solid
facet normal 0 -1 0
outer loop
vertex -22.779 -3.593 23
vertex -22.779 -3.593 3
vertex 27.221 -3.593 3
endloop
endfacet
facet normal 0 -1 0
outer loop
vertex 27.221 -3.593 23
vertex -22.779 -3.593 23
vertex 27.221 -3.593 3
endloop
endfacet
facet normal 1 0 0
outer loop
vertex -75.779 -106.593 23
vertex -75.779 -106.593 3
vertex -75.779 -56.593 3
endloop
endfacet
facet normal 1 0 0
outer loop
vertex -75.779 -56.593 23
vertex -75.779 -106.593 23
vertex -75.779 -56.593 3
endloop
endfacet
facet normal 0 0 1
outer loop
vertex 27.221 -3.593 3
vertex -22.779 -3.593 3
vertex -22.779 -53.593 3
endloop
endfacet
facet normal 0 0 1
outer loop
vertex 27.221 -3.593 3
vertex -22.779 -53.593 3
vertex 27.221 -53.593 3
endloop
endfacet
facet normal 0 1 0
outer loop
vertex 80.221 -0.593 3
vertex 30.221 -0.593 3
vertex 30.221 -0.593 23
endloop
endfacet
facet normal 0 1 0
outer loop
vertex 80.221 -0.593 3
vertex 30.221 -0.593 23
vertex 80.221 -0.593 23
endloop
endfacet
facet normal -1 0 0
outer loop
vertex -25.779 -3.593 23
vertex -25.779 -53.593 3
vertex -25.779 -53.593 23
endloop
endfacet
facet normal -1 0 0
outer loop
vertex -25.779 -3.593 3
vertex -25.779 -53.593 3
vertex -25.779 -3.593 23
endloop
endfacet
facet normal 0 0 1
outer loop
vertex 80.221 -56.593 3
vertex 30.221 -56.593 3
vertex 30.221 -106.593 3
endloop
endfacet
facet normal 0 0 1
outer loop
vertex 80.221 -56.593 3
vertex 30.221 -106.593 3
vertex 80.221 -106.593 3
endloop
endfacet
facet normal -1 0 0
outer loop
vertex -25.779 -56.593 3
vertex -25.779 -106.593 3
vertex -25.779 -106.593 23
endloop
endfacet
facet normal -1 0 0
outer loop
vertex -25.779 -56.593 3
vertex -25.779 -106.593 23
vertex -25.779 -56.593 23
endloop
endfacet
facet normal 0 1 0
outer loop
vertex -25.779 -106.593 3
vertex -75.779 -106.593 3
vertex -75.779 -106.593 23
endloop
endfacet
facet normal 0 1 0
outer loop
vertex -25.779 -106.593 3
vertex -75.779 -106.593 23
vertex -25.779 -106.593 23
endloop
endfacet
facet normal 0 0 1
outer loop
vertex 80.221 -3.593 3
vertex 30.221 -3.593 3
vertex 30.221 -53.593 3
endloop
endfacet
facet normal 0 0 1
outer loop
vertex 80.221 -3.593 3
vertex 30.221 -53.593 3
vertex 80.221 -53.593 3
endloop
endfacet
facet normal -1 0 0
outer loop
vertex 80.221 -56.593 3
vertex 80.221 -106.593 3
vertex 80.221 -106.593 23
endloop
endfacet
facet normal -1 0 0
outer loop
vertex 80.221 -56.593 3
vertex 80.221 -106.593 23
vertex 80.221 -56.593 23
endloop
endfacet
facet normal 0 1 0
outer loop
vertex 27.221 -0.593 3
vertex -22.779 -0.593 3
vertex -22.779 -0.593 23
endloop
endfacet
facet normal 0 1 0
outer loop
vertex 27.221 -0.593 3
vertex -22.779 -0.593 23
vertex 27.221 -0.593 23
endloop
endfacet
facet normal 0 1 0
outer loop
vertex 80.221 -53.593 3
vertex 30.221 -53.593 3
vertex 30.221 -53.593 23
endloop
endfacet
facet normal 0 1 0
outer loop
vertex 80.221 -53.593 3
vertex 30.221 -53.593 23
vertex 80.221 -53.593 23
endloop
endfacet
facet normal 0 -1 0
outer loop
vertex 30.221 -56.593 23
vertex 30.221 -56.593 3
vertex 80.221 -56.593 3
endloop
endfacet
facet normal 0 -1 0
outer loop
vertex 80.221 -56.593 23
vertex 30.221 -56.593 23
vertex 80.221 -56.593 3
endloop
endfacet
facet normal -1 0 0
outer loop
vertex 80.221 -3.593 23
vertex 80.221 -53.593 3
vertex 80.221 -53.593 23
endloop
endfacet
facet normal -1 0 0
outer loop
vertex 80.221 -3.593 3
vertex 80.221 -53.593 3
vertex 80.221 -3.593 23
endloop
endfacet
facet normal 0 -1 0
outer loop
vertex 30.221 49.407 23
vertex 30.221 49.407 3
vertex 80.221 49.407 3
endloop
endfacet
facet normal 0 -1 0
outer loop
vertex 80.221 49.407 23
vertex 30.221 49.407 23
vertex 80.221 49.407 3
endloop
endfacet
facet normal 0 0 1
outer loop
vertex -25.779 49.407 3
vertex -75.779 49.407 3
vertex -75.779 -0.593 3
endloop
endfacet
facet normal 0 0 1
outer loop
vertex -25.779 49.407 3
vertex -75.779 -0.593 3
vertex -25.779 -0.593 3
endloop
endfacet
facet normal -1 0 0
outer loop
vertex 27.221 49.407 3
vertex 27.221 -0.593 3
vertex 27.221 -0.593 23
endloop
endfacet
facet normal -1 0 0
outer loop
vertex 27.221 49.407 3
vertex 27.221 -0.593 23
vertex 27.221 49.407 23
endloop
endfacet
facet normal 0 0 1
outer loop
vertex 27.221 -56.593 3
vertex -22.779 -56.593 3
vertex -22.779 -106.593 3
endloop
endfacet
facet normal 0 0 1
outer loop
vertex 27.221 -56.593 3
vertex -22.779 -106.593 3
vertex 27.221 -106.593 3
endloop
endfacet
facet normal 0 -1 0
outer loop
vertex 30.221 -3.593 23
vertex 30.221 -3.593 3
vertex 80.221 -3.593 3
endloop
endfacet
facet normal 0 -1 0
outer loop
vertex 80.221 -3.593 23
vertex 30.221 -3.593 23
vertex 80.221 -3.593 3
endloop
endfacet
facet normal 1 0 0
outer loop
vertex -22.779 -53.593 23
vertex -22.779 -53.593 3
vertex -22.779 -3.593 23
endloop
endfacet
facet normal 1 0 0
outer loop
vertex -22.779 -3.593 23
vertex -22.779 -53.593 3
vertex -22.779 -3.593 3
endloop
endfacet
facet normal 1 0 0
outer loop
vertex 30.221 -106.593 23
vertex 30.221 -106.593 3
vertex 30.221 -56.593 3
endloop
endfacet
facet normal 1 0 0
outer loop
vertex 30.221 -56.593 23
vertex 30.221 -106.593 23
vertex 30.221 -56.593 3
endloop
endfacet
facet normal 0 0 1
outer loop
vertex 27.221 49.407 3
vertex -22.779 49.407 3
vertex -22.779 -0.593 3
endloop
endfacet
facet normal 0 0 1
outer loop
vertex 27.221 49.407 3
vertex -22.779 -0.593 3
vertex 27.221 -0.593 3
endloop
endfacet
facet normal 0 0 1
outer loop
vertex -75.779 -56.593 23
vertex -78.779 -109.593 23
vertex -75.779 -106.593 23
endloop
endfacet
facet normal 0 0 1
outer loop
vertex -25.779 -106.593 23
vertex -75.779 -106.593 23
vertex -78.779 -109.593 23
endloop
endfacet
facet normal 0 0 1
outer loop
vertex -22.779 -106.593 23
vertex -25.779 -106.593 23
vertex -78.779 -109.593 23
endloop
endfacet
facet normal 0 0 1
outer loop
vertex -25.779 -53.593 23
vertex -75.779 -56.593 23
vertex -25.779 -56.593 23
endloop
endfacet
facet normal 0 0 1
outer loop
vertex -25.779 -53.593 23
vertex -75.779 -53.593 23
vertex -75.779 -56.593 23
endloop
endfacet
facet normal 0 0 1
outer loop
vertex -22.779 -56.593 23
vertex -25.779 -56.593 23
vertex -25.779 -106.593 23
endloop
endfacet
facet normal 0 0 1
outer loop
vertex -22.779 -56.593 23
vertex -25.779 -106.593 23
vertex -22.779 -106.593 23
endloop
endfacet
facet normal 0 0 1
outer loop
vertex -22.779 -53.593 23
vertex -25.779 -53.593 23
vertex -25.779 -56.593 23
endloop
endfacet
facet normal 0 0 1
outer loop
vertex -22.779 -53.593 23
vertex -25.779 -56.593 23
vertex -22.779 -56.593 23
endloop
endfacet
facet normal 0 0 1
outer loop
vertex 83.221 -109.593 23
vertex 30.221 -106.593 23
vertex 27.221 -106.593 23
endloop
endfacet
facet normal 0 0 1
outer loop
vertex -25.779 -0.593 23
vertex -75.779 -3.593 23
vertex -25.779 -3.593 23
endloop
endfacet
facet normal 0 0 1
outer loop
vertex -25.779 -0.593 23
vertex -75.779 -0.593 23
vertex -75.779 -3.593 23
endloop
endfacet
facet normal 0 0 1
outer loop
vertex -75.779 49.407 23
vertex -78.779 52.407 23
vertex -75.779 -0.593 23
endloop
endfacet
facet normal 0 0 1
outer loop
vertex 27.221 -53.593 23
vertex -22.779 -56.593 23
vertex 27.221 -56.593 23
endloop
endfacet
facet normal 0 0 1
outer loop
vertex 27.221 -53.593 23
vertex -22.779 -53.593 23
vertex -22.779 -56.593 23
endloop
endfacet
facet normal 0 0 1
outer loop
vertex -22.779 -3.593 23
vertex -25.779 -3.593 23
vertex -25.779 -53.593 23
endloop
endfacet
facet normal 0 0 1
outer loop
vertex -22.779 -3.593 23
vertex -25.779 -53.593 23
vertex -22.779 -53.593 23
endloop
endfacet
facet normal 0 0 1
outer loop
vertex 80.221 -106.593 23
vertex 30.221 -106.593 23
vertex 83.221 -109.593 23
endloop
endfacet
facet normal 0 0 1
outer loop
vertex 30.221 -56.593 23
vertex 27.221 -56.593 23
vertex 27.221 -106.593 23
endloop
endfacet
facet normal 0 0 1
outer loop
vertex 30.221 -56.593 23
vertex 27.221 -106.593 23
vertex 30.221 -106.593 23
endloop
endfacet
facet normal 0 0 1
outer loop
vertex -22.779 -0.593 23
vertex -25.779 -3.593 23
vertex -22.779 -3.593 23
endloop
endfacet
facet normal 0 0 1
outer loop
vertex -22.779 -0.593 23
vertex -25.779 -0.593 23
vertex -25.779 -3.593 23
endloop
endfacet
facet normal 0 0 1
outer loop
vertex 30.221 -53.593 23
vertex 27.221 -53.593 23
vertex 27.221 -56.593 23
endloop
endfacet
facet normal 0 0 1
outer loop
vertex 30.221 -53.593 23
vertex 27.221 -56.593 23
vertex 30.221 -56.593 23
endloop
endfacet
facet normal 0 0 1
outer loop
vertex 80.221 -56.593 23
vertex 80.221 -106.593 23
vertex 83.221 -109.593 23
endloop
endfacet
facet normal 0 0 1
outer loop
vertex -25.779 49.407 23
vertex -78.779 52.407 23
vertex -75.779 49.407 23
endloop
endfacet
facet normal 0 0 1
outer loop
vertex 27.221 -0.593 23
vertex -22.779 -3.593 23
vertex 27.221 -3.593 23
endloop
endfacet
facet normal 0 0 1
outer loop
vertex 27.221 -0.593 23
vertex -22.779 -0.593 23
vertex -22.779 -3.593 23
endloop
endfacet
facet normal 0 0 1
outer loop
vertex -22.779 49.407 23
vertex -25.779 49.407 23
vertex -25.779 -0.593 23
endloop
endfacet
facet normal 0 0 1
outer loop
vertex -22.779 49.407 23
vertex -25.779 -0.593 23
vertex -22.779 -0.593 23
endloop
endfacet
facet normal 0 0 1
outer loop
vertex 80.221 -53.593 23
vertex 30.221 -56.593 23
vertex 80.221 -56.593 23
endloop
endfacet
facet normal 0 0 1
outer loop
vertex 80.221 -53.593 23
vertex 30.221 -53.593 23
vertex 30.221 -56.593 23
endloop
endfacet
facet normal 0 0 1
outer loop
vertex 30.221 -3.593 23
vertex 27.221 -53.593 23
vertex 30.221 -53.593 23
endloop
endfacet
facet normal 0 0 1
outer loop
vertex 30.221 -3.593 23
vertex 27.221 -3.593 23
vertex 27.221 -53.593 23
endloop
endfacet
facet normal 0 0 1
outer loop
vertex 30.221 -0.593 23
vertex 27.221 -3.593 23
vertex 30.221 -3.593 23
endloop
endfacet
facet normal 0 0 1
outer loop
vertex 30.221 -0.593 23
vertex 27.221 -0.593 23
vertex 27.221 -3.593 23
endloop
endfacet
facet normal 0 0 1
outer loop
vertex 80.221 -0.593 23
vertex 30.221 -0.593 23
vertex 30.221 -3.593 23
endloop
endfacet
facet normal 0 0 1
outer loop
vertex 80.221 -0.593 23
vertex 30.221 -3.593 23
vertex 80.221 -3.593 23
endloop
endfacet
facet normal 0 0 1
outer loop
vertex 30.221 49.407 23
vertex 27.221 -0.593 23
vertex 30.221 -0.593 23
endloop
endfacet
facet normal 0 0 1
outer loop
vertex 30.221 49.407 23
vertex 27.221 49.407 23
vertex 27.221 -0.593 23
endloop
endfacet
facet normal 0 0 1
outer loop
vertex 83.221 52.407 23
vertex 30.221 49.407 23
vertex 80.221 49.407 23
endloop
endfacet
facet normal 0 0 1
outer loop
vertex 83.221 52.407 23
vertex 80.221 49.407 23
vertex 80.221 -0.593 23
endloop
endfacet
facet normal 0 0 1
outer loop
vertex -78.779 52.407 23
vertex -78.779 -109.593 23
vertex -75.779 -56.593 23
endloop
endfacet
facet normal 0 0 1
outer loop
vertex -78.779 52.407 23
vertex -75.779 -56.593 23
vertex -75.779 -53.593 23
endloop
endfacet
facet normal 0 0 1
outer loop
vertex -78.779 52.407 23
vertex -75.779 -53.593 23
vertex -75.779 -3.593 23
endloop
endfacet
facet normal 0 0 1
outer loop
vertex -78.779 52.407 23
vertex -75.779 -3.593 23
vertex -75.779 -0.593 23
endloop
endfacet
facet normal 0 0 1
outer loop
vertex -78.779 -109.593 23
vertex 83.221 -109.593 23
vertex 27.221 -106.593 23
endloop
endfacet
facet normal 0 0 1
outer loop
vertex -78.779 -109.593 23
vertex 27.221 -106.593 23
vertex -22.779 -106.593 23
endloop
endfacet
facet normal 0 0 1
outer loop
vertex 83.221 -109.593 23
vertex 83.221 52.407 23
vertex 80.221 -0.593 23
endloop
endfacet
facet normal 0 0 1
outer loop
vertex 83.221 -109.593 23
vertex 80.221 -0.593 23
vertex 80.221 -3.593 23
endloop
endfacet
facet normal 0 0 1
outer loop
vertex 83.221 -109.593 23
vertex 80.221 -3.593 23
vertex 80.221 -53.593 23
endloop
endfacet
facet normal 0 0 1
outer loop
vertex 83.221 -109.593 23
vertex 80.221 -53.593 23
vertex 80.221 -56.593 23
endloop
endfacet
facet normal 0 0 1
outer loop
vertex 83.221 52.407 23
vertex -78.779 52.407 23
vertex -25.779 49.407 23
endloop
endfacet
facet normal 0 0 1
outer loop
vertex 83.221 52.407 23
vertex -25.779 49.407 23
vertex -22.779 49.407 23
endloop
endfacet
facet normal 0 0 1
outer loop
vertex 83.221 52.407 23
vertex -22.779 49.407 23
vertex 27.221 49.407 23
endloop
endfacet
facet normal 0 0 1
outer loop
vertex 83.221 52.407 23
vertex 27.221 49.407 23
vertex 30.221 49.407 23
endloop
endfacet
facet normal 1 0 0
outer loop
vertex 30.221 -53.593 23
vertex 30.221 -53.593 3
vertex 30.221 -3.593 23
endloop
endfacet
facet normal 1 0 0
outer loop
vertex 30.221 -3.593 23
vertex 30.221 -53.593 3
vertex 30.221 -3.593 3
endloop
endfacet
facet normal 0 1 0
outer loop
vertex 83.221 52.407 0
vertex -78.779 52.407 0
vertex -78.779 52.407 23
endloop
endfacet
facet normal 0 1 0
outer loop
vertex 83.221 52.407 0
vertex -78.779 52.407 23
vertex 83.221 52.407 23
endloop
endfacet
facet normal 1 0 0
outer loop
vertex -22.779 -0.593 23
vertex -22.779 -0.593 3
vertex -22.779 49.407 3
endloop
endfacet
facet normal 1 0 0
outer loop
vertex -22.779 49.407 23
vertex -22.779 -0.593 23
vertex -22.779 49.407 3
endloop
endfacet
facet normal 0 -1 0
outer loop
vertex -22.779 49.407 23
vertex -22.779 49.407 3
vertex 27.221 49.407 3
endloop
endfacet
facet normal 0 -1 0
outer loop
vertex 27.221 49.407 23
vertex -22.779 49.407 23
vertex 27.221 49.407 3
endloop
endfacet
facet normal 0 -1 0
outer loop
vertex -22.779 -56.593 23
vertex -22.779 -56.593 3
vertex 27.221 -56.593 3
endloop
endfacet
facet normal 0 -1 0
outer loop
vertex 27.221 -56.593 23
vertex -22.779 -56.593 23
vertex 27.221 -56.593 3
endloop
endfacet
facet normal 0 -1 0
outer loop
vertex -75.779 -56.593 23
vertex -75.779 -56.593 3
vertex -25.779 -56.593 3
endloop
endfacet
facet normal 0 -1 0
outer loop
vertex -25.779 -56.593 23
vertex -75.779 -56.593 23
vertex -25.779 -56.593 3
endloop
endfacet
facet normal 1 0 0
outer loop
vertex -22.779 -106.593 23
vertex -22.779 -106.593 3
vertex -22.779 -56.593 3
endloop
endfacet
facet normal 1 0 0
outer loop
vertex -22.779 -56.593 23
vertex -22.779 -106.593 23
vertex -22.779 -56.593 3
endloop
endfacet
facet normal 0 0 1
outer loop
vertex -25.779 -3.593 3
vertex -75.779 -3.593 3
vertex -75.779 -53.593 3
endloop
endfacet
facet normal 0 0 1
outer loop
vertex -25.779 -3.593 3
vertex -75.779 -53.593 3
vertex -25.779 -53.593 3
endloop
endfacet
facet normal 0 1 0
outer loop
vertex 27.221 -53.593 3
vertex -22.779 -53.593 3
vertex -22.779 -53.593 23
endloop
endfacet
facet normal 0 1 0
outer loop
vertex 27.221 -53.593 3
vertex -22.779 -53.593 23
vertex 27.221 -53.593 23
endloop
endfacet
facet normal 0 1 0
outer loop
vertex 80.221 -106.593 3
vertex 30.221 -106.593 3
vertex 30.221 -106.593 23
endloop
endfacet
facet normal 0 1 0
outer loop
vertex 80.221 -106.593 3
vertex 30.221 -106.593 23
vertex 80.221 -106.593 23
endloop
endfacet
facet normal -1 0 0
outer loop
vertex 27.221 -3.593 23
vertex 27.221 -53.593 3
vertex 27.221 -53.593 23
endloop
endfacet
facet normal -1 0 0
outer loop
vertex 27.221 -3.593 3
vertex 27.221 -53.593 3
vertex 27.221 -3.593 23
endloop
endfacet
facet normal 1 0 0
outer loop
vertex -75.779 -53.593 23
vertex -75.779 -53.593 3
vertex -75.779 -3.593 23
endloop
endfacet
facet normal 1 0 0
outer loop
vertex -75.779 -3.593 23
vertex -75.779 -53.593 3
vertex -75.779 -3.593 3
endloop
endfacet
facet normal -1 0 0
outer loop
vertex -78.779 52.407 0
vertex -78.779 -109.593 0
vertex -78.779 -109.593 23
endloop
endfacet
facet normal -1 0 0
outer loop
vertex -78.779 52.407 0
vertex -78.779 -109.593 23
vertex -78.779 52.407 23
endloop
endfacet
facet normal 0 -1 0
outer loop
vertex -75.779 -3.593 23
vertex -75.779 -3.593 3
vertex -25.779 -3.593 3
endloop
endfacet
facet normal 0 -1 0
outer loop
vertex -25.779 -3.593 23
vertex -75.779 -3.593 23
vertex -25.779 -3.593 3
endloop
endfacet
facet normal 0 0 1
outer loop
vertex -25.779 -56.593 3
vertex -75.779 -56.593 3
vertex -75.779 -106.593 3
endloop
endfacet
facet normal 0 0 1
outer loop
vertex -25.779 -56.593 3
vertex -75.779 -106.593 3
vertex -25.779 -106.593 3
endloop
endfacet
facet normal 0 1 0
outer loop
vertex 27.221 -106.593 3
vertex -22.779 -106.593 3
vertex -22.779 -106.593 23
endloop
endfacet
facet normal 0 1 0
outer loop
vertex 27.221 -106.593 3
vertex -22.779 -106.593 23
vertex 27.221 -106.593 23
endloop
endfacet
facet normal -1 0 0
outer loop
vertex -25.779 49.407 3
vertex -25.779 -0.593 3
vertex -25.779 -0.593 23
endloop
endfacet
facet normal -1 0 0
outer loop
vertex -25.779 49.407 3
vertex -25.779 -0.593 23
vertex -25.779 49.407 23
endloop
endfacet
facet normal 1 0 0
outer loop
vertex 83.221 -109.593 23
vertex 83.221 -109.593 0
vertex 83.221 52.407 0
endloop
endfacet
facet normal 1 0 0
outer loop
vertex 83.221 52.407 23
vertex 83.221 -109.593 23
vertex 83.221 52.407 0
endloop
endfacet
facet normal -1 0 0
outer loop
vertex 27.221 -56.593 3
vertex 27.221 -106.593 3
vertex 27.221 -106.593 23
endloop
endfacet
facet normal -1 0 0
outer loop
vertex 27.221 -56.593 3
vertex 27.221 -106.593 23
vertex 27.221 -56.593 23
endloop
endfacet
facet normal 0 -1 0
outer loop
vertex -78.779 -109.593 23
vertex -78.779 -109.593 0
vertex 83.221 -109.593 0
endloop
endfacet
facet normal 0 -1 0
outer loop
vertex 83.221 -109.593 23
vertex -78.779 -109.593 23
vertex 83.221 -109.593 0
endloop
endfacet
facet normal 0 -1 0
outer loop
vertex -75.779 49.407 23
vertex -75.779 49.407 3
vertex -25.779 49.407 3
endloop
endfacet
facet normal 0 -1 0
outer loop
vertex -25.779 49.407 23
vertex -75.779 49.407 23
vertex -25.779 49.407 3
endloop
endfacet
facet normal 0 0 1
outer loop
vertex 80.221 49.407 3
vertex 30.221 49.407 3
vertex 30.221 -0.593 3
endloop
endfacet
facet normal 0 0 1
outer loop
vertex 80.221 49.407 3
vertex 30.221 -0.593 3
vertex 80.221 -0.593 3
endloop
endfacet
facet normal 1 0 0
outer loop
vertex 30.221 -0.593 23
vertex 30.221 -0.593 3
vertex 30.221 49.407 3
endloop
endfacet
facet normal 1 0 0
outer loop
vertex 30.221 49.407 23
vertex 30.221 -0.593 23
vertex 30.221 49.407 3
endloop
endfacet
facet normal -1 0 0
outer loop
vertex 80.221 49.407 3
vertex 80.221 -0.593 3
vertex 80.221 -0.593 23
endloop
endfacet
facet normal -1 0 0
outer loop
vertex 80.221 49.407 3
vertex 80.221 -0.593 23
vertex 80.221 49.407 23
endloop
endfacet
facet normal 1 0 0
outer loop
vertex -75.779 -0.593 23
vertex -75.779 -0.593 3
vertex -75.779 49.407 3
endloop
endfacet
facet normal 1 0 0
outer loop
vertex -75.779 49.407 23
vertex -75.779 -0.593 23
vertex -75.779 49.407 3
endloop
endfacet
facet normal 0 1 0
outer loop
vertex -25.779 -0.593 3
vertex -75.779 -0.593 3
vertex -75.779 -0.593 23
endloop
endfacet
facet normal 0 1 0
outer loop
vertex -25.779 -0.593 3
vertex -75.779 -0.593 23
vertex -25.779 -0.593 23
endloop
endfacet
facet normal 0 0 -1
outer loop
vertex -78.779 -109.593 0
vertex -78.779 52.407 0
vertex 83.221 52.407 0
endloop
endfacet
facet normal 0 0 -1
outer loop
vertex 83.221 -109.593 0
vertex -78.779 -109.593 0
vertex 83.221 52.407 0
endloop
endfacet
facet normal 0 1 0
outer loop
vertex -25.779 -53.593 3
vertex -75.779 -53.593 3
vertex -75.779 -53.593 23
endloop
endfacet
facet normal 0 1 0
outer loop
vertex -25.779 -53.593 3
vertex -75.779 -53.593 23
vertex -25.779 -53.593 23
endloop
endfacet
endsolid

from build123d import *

# Parameters (mm, degrees)
SKETCH1_W           = 162
SKETCH1_H           = 162
SKETCH1_W_2         = 50
SKETCH1_H_2         = 50
BOSS_EXTRUDE1_DEPTH = 23
SKETCH1_2_W         = 162
SKETCH1_2_H         = 162
BOSS_EXTRUDE2_DEPTH = 3


with BuildPart() as part:
    # Sketch1 → Boss-Extrude1 (new body)
    with BuildSketch(Plane.XY):
        with Locations((2.220930233, -28.593023256)):
            Rectangle(SKETCH1_W, SKETCH1_H)
        with Locations((-50.779069767, 24.406976744)):
            Rectangle(SKETCH1_W_2, SKETCH1_H_2, mode=Mode.SUBTRACT)
        with Locations((2.220930233, 24.406976744)):
            Rectangle(SKETCH1_W_2, SKETCH1_H_2, mode=Mode.SUBTRACT)
        with Locations((55.220930233, 24.406976744)):
            Rectangle(SKETCH1_W_2, SKETCH1_H_2, mode=Mode.SUBTRACT)
        with Locations((-50.779069767, -28.593023256)):
            Rectangle(SKETCH1_W_2, SKETCH1_H_2, mode=Mode.SUBTRACT)
        with Locations((2.220930233, -28.593023256)):
            Rectangle(SKETCH1_W_2, SKETCH1_H_2, mode=Mode.SUBTRACT)
        with Locations((55.220930233, -28.593023256)):
            Rectangle(SKETCH1_W_2, SKETCH1_H_2, mode=Mode.SUBTRACT)
        with Locations((-50.779069767, -81.593023256)):
            Rectangle(SKETCH1_W_2, SKETCH1_H_2, mode=Mode.SUBTRACT)
        with Locations((2.220930233, -81.593023256)):
            Rectangle(SKETCH1_W_2, SKETCH1_H_2, mode=Mode.SUBTRACT)
        with Locations((55.220930233, -81.593023256)):
            Rectangle(SKETCH1_W_2, SKETCH1_H_2, mode=Mode.SUBTRACT)
    extrude(amount=BOSS_EXTRUDE1_DEPTH)

    # Sketch1<2> → Boss-Extrude2 (add)
    with BuildSketch(Plane.XY):
        with Locations((2.220930233, -28.593023256)):
            Rectangle(SKETCH1_2_W, SKETCH1_2_H)
    extrude(amount=BOSS_EXTRUDE2_DEPTH)


solid = part.part
